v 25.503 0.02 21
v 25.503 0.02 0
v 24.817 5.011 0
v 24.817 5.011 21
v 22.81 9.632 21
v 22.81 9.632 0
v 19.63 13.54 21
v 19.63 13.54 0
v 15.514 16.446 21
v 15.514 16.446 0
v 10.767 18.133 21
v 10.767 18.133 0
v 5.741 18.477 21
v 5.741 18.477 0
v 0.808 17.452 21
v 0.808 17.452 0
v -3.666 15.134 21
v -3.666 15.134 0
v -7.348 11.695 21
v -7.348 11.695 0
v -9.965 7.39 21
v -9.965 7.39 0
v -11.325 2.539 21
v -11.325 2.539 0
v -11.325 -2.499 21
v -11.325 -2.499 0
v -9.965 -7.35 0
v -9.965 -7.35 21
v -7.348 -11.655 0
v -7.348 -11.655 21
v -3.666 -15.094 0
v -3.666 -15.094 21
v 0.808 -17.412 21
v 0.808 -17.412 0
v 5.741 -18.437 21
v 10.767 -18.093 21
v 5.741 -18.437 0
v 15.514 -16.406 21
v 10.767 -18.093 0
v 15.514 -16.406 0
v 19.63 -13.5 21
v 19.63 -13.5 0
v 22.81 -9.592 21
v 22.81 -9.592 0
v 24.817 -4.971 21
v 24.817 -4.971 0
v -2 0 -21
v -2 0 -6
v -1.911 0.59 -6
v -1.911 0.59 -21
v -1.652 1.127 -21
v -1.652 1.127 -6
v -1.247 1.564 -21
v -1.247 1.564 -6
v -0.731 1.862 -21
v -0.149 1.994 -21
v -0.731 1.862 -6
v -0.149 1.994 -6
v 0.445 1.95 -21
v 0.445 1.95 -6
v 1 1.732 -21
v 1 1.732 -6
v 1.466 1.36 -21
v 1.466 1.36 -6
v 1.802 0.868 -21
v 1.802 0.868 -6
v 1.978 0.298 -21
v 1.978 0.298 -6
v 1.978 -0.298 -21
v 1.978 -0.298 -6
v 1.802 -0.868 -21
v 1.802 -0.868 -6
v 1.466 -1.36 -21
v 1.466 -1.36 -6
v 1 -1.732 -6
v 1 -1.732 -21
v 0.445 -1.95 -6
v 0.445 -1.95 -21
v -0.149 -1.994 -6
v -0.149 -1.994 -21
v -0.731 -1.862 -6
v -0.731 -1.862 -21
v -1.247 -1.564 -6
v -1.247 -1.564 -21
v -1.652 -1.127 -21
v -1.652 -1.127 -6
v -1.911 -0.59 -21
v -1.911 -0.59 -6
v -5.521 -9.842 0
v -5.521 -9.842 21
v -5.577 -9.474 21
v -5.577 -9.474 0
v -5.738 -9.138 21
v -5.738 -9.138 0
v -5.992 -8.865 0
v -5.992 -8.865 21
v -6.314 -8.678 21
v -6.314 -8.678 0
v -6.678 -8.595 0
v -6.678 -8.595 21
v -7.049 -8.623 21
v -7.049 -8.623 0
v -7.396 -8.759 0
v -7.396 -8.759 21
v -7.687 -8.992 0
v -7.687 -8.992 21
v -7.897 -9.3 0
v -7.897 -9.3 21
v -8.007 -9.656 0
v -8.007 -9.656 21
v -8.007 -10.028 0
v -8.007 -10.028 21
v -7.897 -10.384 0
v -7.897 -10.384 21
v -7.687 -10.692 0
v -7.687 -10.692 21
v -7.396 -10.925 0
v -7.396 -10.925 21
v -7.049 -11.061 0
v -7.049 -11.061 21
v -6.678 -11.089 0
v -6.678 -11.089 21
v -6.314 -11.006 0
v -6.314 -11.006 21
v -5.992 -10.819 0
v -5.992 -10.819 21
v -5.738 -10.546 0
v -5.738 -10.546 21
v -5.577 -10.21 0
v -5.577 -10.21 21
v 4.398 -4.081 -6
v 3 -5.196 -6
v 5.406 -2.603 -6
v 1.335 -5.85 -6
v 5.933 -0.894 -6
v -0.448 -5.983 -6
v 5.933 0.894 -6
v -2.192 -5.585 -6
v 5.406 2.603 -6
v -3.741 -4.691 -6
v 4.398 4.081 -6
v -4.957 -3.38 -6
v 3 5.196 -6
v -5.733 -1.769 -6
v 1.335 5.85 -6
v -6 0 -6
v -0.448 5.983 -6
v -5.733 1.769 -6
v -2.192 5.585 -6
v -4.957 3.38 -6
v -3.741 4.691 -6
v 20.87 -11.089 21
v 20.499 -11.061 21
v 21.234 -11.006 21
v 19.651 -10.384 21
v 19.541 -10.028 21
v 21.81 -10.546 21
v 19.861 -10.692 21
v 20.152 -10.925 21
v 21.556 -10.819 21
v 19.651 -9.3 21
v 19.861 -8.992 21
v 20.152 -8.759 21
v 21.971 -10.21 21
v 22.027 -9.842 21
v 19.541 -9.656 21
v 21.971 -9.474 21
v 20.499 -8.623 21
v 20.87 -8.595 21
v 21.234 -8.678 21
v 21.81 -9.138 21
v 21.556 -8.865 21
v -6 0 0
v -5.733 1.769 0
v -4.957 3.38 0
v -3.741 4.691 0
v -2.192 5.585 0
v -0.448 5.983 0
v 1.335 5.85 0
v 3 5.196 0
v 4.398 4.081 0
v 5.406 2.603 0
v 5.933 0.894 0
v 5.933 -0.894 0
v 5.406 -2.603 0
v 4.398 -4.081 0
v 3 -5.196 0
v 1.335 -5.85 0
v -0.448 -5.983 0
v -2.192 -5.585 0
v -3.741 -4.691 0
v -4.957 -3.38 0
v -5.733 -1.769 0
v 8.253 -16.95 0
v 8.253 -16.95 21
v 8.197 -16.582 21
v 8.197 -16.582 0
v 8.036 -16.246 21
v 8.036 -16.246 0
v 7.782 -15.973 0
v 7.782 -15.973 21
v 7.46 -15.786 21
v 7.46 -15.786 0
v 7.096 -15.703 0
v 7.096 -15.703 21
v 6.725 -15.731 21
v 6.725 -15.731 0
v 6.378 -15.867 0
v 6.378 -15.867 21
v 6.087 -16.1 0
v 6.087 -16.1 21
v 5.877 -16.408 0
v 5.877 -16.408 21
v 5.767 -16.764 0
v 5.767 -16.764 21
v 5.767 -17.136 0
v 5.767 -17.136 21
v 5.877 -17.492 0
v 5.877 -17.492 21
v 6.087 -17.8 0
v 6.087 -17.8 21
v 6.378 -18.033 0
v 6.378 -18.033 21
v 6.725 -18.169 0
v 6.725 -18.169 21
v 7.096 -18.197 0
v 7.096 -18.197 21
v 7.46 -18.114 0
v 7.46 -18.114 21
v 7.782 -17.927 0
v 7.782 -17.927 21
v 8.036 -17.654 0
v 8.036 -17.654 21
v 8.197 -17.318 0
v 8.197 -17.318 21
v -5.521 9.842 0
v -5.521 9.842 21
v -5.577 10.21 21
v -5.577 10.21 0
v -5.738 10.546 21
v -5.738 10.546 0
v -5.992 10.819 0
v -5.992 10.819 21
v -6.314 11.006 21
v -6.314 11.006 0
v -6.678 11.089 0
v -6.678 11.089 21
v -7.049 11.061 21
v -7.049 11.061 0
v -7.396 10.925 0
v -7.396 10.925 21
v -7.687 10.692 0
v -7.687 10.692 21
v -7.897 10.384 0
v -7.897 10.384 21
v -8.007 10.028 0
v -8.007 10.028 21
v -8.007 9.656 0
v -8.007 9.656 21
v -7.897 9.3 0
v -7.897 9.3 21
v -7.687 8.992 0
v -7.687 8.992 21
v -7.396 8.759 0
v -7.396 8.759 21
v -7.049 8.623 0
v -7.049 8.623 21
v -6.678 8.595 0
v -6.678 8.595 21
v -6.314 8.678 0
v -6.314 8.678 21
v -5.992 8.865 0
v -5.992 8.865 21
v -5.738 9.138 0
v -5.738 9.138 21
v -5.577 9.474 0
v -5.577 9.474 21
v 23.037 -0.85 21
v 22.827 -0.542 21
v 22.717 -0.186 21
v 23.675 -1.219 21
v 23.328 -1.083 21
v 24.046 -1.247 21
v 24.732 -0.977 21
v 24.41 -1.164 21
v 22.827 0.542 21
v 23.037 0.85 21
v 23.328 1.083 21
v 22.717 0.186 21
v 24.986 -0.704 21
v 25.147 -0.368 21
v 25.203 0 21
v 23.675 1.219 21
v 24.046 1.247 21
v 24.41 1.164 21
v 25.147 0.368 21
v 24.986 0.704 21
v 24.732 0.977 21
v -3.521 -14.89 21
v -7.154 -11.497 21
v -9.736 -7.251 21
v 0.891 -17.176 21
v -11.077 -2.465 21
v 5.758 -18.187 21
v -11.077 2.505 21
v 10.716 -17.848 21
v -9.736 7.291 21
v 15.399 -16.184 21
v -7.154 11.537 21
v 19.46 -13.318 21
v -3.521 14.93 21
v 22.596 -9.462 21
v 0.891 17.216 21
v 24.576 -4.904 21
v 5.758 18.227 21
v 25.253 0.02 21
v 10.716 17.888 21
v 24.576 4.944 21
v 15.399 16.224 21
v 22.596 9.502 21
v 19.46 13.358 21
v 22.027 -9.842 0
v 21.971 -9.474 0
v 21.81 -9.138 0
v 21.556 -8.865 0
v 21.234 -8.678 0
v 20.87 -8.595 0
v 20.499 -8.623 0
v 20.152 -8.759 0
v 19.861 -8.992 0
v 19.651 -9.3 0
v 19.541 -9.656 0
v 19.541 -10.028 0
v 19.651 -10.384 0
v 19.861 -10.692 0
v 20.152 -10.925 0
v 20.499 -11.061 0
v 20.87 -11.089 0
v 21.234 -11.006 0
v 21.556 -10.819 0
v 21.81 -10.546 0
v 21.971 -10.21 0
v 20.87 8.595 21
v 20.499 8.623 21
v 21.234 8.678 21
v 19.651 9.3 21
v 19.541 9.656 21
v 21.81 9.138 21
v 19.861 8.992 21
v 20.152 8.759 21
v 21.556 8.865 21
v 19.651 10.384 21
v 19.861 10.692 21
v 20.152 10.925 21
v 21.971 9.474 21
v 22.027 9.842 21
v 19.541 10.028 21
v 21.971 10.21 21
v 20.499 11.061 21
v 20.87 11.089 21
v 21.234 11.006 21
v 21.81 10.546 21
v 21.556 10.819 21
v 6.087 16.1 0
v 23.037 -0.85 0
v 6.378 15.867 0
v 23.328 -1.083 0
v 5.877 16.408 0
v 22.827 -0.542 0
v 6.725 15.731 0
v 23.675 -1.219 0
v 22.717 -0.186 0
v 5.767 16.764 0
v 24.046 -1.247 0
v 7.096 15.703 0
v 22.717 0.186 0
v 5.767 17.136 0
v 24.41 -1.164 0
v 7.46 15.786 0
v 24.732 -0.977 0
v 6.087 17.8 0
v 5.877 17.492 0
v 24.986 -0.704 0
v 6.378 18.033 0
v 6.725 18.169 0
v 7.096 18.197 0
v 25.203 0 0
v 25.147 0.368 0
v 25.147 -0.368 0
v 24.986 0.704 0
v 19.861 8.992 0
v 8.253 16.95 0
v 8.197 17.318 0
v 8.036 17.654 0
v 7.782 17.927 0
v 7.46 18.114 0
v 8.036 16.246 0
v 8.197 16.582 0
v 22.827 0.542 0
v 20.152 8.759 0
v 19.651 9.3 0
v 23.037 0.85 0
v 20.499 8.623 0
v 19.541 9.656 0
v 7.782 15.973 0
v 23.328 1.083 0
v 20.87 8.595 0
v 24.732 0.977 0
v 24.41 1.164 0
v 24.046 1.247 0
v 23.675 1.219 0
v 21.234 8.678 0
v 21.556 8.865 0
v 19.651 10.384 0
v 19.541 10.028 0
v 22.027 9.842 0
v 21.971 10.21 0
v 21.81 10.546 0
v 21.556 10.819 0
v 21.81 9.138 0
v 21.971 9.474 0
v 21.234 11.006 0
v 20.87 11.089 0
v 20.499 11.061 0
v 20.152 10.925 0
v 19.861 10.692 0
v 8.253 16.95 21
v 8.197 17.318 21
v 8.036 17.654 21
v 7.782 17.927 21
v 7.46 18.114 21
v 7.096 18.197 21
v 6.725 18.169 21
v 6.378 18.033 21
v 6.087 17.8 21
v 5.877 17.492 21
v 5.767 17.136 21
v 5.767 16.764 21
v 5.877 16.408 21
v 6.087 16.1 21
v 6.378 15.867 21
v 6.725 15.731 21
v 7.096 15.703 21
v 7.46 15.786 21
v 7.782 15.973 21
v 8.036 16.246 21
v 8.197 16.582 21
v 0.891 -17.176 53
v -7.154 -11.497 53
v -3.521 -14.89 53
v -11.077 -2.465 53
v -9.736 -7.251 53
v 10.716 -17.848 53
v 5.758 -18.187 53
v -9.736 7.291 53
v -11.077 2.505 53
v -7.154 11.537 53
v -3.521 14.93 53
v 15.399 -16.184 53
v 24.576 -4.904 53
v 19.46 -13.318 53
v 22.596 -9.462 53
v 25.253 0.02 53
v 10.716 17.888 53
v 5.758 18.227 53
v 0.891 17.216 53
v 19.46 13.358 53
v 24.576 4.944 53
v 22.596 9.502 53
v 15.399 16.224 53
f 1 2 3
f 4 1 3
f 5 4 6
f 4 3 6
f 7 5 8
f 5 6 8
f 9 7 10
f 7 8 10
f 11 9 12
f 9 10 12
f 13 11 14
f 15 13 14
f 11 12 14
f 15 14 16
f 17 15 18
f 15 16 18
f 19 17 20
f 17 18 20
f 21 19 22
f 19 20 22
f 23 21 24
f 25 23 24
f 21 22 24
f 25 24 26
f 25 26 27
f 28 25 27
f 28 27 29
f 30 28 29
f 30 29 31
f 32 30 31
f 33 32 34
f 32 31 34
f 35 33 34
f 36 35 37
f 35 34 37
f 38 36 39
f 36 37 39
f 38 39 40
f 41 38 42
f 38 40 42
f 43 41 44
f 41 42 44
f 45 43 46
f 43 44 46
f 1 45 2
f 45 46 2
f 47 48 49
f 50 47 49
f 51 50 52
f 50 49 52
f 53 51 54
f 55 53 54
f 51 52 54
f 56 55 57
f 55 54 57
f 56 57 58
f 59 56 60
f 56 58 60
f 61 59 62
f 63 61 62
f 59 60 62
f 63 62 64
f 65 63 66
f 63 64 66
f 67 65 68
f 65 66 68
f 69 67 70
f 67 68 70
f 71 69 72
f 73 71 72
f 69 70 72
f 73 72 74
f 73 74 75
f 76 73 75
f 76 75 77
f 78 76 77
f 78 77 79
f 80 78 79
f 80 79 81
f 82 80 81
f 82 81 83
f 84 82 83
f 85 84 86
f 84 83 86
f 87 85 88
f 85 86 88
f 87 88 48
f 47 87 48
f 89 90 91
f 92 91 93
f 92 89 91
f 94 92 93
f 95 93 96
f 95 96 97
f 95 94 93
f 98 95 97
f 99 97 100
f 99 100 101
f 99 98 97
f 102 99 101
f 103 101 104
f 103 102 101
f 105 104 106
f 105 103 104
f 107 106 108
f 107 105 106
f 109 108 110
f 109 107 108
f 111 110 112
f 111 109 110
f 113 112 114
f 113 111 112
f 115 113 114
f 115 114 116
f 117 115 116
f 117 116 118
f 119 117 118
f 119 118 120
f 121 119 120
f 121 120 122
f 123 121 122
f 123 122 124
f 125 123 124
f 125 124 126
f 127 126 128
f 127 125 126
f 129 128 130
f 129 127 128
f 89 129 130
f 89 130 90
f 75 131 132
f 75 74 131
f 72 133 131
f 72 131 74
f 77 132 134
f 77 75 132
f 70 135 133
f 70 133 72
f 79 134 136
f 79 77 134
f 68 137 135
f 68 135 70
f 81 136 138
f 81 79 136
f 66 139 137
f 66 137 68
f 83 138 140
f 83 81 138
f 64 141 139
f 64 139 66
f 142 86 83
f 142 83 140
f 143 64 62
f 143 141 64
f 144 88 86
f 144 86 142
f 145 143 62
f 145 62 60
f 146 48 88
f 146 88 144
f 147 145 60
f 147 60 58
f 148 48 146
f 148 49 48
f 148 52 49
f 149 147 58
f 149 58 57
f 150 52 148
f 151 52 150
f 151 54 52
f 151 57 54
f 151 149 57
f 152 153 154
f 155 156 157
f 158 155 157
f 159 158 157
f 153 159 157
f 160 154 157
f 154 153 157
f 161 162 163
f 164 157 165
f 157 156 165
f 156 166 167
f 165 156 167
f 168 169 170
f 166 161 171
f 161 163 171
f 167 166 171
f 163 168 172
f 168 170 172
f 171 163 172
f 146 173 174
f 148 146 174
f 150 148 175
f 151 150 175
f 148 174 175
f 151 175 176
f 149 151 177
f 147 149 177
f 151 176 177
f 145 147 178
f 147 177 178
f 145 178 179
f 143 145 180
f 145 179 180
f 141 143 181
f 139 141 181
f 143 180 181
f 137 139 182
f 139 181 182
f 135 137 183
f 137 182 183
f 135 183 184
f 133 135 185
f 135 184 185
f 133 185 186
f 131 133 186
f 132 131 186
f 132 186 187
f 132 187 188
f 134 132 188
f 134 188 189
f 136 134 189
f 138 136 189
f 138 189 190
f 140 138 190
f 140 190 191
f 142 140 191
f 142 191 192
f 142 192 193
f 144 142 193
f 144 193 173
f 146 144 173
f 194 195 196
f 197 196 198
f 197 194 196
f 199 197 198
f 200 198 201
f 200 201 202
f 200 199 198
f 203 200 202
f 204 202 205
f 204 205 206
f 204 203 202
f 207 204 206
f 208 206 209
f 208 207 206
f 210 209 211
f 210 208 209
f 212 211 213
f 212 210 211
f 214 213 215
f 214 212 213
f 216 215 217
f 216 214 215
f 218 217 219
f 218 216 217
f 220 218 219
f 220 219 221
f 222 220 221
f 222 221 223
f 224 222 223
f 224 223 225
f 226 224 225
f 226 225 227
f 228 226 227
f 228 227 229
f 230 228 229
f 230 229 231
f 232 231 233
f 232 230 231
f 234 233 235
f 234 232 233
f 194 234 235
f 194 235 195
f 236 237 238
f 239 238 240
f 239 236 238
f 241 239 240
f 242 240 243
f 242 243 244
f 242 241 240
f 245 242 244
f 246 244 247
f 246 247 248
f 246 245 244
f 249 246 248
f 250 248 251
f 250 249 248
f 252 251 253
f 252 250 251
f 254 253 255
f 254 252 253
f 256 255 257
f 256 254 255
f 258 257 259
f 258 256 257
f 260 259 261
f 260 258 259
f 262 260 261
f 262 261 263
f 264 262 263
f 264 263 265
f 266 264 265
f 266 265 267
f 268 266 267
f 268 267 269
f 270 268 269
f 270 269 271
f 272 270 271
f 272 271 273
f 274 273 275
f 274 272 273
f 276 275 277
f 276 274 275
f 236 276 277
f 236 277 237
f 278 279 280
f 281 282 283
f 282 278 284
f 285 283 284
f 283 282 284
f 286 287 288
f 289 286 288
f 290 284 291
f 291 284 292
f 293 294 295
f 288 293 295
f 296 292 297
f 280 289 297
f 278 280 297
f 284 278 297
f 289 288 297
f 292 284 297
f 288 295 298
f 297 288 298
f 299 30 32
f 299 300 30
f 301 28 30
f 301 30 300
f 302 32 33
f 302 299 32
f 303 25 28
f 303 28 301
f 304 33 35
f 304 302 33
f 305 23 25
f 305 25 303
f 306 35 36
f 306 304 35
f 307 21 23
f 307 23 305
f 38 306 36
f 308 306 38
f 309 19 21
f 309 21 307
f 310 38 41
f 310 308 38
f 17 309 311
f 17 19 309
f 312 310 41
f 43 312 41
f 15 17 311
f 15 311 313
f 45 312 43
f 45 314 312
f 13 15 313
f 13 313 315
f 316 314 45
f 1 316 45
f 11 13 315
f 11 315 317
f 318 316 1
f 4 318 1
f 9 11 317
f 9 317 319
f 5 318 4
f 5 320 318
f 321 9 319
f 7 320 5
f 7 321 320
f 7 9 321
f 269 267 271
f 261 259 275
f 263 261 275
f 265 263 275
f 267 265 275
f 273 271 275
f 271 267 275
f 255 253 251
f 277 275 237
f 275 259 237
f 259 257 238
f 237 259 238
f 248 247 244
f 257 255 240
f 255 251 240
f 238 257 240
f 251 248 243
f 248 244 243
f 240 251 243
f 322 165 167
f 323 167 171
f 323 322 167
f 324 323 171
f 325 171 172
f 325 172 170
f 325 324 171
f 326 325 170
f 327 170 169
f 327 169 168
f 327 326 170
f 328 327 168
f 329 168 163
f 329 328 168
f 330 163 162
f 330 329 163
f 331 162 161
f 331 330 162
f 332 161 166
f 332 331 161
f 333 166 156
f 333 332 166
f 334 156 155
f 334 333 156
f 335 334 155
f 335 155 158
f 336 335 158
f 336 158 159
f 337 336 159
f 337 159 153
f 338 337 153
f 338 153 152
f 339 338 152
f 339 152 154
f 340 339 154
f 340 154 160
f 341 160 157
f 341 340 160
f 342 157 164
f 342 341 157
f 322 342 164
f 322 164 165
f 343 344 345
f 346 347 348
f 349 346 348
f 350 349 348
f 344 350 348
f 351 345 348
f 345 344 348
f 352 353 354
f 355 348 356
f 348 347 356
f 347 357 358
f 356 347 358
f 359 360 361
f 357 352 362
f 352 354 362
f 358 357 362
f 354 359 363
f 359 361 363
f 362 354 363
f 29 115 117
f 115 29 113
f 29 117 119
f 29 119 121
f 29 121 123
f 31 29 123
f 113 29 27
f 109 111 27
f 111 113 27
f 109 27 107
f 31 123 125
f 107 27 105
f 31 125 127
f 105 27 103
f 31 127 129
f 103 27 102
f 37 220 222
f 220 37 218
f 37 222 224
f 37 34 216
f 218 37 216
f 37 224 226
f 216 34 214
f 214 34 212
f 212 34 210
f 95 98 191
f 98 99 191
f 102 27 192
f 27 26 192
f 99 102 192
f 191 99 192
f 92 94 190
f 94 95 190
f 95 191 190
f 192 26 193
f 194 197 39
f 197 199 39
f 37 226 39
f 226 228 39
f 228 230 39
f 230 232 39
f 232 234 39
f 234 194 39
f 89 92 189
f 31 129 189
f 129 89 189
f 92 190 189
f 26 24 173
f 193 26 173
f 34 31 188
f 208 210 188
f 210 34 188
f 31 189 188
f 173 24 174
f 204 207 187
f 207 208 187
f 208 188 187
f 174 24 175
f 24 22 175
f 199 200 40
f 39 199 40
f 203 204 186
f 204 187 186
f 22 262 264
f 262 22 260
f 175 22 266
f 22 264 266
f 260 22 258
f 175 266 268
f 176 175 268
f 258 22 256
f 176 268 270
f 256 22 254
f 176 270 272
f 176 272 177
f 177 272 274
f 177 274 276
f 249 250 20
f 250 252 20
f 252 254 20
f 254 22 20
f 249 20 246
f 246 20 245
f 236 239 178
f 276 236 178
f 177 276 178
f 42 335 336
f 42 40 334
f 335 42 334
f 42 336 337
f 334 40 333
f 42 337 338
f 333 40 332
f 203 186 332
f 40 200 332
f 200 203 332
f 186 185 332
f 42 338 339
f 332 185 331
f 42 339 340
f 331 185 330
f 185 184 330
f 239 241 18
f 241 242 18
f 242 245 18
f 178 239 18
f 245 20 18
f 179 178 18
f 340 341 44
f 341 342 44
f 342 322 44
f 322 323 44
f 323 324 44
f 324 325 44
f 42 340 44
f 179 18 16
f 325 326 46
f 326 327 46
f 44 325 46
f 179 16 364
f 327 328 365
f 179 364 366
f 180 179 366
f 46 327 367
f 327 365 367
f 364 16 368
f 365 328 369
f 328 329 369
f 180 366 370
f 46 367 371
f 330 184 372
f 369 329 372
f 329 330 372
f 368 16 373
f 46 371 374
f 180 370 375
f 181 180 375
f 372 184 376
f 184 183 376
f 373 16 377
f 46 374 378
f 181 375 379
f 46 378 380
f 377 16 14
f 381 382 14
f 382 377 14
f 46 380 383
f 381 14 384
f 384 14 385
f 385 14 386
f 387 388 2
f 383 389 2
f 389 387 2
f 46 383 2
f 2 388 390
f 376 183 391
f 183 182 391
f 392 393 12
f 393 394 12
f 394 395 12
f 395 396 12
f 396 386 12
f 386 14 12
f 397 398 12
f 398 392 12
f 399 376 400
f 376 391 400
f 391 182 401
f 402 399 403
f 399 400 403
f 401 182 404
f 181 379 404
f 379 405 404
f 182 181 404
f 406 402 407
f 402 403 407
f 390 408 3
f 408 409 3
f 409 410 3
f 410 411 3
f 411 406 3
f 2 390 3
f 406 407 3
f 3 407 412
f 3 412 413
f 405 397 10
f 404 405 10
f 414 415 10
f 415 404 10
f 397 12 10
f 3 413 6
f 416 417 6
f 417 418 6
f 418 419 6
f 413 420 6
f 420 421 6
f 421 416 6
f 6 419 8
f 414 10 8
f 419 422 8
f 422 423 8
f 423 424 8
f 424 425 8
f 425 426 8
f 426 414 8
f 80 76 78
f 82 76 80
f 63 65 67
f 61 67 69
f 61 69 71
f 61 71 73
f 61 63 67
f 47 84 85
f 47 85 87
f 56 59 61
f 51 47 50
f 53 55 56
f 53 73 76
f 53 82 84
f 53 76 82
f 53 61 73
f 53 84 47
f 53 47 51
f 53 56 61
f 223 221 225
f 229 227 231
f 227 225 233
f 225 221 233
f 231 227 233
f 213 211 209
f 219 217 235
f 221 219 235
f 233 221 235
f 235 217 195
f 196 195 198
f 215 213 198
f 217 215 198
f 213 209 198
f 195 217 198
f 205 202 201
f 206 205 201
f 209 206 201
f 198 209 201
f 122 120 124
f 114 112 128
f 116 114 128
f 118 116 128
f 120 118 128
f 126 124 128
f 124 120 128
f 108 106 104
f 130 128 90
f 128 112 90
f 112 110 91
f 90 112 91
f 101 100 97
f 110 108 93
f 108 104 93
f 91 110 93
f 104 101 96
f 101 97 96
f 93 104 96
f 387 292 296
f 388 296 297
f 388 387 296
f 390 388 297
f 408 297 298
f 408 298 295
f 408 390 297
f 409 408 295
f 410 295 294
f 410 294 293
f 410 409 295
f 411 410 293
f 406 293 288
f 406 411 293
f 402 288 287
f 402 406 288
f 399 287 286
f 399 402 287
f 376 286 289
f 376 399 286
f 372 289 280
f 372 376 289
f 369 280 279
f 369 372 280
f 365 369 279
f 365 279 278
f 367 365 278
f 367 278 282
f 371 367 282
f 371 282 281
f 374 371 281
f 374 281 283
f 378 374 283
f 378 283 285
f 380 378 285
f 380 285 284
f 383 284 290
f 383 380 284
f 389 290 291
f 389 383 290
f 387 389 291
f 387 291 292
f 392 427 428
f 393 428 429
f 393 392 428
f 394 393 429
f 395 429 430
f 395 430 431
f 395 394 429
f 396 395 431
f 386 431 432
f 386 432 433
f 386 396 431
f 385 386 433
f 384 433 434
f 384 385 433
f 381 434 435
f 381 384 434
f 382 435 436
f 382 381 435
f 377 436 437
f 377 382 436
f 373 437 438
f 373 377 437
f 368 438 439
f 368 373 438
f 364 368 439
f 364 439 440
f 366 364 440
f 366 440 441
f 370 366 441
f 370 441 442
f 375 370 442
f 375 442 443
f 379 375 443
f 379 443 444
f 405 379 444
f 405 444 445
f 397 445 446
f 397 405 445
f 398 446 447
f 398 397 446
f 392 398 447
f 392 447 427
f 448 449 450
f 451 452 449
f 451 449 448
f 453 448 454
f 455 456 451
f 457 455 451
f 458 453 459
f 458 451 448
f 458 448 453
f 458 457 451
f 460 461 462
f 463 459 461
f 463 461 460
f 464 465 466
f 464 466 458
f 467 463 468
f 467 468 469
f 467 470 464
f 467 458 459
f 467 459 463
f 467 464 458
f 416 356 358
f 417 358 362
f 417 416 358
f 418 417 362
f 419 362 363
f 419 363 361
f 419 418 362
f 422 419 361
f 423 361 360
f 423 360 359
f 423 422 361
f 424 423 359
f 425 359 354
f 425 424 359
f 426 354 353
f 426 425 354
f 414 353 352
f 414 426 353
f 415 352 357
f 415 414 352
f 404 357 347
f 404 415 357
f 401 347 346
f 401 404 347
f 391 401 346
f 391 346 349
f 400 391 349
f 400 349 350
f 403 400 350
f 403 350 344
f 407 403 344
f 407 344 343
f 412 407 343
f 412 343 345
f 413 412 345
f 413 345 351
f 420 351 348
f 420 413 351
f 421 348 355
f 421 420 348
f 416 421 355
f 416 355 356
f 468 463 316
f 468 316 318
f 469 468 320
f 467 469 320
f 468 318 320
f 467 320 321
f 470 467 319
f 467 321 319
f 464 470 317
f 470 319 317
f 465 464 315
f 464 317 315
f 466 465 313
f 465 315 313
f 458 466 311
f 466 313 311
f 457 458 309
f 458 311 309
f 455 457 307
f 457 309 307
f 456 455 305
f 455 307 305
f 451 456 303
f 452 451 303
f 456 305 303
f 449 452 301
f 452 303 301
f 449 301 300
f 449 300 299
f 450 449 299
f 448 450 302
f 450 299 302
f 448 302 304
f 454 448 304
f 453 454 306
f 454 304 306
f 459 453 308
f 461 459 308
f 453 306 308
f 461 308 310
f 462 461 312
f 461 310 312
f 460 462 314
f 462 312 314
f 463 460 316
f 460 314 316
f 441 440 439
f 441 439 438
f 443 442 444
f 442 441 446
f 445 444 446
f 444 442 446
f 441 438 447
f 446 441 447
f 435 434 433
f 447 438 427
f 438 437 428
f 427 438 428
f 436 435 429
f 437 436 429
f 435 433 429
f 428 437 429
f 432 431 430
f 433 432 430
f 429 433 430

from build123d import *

# Parameters (mm, degrees)
MODEL_R                  = 18.5
MODEL_R_2                = 1.25
MODEL_R_3                = 6
RESSALTO_EXTRUS_O1_DEPTH = 21
ESBO_O2_R                = 18.25
RESSALTO_EXTRUS_O5_DEPTH = 32
ESBO_O3_R                = 6
RESSALTO_EXTRUS_O6_DEPTH = 27
ESBO_O4_R                = 2
RESSALTO_EXTRUS_O7_DEPTH = 15


with BuildPart() as part:
    # Model → Ressalto-extrusão1 (new body)
    with BuildSketch(Plane.XY):
        with Locations((7.003, 0.02)):
            Circle(MODEL_R)
        with Locations((20.777, -9.842)):
            Circle(MODEL_R_2, mode=Mode.SUBTRACT)
        with Locations((23.953, 0)):
            Circle(MODEL_R_2, mode=Mode.SUBTRACT)
        with Locations((20.777, 9.842)):
            Circle(MODEL_R_2, mode=Mode.SUBTRACT)
        with Locations((7.003, 16.95)):
            Circle(MODEL_R_2, mode=Mode.SUBTRACT)
        with Locations((-6.771, 9.842)):
            Circle(MODEL_R_2, mode=Mode.SUBTRACT)
        with Locations((-6.771, -9.842)):
            Circle(MODEL_R_2, mode=Mode.SUBTRACT)
        with Locations((7.003, -16.95)):
            Circle(MODEL_R_2, mode=Mode.SUBTRACT)
        Circle(MODEL_R_3, mode=Mode.SUBTRACT)
    extrude(amount=RESSALTO_EXTRUS_O1_DEPTH)

    # Esboço2 → Ressalto-extrusão5 (add)
    with BuildSketch(Plane.XY.offset(21)):
        with Locations((7.003, 0.02)):
            Circle(ESBO_O2_R)
    extrude(amount=RESSALTO_EXTRUS_O5_DEPTH)

    # Esboço3 → Ressalto-extrusão6 (add)
    with BuildSketch(Plane(origin=(0, 0, 21), x_dir=(-1, 0, 0), z_dir=(0, 0, -1))):
        Circle(ESBO_O3_R)
    extrude(amount=RESSALTO_EXTRUS_O6_DEPTH)

    # Esboço4 → Ressalto-extrusão7 (add)
    with BuildSketch(Plane(origin=(0, 0, -6), x_dir=(-1, 0, 0), z_dir=(0, 0, -1))):
        Circle(ESBO_O4_R)
    extrude(amount=RESSALTO_EXTRUS_O7_DEPTH)


solid = part.part
